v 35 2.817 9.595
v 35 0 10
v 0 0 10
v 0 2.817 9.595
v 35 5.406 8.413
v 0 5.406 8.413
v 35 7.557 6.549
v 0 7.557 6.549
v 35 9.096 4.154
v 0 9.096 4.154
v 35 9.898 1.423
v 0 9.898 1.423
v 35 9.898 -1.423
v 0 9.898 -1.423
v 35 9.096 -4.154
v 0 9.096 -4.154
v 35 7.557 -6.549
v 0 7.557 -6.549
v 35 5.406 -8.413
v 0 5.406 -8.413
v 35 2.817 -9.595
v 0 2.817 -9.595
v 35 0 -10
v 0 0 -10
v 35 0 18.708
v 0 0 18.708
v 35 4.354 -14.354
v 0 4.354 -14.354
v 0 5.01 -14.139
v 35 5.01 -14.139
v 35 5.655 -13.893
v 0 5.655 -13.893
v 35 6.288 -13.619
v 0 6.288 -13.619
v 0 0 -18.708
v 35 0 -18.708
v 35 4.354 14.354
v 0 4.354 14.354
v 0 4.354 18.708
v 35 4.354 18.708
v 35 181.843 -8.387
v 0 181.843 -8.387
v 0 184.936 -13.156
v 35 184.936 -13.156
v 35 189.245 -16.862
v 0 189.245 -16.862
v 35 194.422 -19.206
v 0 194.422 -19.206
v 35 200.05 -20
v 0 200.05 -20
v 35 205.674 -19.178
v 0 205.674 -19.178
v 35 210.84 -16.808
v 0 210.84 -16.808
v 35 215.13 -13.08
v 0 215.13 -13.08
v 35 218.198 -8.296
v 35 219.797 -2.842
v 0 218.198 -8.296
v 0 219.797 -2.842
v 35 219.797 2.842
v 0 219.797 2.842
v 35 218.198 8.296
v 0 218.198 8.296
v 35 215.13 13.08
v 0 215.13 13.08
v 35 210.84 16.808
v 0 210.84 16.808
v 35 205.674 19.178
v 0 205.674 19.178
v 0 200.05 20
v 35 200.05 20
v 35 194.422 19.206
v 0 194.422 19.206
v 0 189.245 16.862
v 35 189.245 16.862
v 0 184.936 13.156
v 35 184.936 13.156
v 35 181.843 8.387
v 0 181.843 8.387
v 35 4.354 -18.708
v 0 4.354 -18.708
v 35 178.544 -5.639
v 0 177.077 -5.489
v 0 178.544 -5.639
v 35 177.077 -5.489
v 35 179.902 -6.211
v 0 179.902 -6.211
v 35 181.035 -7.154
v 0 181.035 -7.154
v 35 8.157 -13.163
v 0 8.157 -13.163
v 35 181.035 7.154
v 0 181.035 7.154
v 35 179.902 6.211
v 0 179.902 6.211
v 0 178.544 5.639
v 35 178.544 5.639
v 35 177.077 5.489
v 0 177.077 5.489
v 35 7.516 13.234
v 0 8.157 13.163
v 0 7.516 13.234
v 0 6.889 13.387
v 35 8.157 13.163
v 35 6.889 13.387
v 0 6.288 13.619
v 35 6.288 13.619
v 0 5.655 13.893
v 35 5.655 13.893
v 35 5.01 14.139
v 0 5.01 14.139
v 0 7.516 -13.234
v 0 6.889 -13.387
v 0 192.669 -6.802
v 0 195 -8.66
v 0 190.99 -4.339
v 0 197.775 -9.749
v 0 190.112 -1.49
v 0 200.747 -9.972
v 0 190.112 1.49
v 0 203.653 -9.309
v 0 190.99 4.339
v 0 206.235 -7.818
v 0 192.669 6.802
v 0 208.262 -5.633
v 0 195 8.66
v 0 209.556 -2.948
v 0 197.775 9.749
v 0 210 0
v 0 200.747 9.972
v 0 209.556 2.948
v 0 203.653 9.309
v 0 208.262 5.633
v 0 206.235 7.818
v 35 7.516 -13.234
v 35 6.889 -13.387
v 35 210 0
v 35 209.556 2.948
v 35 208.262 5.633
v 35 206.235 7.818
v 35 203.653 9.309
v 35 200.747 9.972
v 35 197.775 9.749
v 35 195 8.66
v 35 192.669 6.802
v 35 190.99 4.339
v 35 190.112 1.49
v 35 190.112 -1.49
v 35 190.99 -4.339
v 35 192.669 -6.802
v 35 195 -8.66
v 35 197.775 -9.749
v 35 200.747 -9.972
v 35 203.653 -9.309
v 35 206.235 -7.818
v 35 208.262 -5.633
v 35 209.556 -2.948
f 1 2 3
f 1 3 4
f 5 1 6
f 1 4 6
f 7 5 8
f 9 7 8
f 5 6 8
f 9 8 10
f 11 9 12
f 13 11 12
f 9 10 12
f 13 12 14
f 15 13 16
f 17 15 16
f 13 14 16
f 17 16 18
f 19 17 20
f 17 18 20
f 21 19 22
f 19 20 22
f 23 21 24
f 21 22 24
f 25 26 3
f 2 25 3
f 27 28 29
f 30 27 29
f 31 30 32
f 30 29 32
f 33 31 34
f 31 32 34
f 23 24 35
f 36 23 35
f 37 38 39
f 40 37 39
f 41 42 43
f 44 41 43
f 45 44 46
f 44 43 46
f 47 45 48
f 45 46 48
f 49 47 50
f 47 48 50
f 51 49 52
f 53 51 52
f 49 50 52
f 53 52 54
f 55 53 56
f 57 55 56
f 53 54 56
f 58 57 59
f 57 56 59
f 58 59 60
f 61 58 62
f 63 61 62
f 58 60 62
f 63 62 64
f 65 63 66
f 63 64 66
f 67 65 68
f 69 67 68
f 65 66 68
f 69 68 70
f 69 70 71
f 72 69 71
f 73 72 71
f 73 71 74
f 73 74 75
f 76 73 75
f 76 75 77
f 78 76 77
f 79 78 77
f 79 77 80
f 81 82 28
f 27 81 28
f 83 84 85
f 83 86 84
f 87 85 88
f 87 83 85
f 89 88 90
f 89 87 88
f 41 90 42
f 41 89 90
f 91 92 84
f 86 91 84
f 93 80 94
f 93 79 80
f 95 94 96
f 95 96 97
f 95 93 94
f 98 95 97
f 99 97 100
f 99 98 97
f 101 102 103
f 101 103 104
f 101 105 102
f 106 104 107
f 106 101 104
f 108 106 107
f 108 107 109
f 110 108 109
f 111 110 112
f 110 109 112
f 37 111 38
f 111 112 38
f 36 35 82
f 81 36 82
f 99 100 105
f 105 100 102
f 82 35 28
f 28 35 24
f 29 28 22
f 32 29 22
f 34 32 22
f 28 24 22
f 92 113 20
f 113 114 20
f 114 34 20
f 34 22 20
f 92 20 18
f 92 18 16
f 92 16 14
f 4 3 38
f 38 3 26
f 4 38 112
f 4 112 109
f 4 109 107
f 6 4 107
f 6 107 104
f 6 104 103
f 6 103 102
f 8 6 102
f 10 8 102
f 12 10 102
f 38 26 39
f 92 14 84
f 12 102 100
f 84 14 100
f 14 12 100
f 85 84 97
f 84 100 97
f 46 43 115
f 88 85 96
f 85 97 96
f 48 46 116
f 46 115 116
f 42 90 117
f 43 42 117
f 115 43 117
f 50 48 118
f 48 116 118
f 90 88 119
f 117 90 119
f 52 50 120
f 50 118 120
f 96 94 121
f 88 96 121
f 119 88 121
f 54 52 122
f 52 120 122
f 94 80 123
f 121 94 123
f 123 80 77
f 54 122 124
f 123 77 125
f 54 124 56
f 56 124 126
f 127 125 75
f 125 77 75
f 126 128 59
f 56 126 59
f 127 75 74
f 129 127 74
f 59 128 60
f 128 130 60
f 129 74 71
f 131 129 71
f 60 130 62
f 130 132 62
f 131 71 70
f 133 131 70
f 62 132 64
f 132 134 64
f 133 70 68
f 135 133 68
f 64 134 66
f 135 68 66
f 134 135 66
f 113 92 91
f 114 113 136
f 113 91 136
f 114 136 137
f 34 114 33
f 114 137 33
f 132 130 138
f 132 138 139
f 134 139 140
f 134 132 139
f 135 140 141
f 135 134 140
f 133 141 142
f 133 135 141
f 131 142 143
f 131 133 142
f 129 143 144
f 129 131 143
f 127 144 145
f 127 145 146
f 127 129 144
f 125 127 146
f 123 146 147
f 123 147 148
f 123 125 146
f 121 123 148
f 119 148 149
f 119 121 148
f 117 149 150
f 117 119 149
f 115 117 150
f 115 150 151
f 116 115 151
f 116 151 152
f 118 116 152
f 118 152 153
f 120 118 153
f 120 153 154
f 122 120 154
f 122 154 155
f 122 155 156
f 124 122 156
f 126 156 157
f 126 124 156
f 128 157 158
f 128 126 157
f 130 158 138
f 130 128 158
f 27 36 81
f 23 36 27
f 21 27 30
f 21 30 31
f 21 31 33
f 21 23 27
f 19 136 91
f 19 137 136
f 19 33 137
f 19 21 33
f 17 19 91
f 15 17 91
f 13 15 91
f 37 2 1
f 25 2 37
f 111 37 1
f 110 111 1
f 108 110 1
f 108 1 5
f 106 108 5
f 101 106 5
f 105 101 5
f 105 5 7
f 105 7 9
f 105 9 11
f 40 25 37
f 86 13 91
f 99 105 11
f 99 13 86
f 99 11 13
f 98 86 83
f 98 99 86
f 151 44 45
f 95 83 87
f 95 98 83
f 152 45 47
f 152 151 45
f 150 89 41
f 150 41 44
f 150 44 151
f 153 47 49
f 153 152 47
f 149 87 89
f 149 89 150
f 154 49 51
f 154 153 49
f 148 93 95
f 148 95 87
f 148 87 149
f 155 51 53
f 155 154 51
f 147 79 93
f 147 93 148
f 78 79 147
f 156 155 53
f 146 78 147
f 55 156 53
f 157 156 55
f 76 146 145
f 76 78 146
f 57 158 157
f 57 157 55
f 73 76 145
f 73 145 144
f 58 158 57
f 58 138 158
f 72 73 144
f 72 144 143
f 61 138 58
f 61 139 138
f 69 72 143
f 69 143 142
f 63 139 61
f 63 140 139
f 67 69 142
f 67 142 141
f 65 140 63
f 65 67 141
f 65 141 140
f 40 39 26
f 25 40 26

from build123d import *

# Parameters (mm, degrees)
F0_R     = 10
F1_DEPTH = 35
F2_R     = 5


# Not quite as in the source:
# - a feature names something its author has since deleted; it is built from what else it names


with BuildPart() as f1:
    # F0 (on Right) → F1 (new body)
    with BuildSketch(Plane.YZ):
        with BuildLine():
            Line((7.1040201683, -13.2110899417), (180.721386468, -5.3230686907))
            ThreePointArc((180.721386468, -5.3230686907), (220, 0), (180.721386468, 5.3230686907))
            Line((180.721386468, 5.3230686907), (7.1040201683, 13.2110899417))
            ThreePointArc((7.1040201683, 13.2110899417), (5.7575186768, 13.8510280733), (4.3541434669, 14.3541434669))
            Line((4.3541434669, 14.3541434669), (4.3541434669, 18.7082869339))
            Line((4.3541434669, 18.7082869339), (0, 18.7082869339))
            Line((0, 18.7082869339), (0, 14.3541434669))
            Line((0, 14.3541434669), (0, 10))
            ThreePointArc((0, 10), (10, 0), (0, -10))
            Line((0, -10), (0, -14.3541434669))
            Line((0, -14.3541434669), (0, -18.7082869339))
            Line((0, -18.7082869339), (4.3541434669, -18.7082869339))
            Line((4.3541434669, -18.7082869339), (4.3541434669, -14.3541434669))
            ThreePointArc((4.3541434669, -14.3541434669), (5.7575186768, -13.8510280733), (7.1040201683, -13.2110899417))
        make_face()
        with Locations((200, 0)):
            Circle(F0_R, mode=Mode.SUBTRACT)
    extrude(amount=F1_DEPTH)

    # F2
    f2_edges = [f1.edges().sort_by_distance(p)[0] for p in [
        (17.5, 7.10402, 13.21109),
        (17.5, 180.721386, 5.323069),
        (17.5, 180.721386, -5.323069),
        (17.5, 7.10402, -13.21109),
    ]]
    fillet(f2_edges, radius=F2_R)


solid = f1.part
